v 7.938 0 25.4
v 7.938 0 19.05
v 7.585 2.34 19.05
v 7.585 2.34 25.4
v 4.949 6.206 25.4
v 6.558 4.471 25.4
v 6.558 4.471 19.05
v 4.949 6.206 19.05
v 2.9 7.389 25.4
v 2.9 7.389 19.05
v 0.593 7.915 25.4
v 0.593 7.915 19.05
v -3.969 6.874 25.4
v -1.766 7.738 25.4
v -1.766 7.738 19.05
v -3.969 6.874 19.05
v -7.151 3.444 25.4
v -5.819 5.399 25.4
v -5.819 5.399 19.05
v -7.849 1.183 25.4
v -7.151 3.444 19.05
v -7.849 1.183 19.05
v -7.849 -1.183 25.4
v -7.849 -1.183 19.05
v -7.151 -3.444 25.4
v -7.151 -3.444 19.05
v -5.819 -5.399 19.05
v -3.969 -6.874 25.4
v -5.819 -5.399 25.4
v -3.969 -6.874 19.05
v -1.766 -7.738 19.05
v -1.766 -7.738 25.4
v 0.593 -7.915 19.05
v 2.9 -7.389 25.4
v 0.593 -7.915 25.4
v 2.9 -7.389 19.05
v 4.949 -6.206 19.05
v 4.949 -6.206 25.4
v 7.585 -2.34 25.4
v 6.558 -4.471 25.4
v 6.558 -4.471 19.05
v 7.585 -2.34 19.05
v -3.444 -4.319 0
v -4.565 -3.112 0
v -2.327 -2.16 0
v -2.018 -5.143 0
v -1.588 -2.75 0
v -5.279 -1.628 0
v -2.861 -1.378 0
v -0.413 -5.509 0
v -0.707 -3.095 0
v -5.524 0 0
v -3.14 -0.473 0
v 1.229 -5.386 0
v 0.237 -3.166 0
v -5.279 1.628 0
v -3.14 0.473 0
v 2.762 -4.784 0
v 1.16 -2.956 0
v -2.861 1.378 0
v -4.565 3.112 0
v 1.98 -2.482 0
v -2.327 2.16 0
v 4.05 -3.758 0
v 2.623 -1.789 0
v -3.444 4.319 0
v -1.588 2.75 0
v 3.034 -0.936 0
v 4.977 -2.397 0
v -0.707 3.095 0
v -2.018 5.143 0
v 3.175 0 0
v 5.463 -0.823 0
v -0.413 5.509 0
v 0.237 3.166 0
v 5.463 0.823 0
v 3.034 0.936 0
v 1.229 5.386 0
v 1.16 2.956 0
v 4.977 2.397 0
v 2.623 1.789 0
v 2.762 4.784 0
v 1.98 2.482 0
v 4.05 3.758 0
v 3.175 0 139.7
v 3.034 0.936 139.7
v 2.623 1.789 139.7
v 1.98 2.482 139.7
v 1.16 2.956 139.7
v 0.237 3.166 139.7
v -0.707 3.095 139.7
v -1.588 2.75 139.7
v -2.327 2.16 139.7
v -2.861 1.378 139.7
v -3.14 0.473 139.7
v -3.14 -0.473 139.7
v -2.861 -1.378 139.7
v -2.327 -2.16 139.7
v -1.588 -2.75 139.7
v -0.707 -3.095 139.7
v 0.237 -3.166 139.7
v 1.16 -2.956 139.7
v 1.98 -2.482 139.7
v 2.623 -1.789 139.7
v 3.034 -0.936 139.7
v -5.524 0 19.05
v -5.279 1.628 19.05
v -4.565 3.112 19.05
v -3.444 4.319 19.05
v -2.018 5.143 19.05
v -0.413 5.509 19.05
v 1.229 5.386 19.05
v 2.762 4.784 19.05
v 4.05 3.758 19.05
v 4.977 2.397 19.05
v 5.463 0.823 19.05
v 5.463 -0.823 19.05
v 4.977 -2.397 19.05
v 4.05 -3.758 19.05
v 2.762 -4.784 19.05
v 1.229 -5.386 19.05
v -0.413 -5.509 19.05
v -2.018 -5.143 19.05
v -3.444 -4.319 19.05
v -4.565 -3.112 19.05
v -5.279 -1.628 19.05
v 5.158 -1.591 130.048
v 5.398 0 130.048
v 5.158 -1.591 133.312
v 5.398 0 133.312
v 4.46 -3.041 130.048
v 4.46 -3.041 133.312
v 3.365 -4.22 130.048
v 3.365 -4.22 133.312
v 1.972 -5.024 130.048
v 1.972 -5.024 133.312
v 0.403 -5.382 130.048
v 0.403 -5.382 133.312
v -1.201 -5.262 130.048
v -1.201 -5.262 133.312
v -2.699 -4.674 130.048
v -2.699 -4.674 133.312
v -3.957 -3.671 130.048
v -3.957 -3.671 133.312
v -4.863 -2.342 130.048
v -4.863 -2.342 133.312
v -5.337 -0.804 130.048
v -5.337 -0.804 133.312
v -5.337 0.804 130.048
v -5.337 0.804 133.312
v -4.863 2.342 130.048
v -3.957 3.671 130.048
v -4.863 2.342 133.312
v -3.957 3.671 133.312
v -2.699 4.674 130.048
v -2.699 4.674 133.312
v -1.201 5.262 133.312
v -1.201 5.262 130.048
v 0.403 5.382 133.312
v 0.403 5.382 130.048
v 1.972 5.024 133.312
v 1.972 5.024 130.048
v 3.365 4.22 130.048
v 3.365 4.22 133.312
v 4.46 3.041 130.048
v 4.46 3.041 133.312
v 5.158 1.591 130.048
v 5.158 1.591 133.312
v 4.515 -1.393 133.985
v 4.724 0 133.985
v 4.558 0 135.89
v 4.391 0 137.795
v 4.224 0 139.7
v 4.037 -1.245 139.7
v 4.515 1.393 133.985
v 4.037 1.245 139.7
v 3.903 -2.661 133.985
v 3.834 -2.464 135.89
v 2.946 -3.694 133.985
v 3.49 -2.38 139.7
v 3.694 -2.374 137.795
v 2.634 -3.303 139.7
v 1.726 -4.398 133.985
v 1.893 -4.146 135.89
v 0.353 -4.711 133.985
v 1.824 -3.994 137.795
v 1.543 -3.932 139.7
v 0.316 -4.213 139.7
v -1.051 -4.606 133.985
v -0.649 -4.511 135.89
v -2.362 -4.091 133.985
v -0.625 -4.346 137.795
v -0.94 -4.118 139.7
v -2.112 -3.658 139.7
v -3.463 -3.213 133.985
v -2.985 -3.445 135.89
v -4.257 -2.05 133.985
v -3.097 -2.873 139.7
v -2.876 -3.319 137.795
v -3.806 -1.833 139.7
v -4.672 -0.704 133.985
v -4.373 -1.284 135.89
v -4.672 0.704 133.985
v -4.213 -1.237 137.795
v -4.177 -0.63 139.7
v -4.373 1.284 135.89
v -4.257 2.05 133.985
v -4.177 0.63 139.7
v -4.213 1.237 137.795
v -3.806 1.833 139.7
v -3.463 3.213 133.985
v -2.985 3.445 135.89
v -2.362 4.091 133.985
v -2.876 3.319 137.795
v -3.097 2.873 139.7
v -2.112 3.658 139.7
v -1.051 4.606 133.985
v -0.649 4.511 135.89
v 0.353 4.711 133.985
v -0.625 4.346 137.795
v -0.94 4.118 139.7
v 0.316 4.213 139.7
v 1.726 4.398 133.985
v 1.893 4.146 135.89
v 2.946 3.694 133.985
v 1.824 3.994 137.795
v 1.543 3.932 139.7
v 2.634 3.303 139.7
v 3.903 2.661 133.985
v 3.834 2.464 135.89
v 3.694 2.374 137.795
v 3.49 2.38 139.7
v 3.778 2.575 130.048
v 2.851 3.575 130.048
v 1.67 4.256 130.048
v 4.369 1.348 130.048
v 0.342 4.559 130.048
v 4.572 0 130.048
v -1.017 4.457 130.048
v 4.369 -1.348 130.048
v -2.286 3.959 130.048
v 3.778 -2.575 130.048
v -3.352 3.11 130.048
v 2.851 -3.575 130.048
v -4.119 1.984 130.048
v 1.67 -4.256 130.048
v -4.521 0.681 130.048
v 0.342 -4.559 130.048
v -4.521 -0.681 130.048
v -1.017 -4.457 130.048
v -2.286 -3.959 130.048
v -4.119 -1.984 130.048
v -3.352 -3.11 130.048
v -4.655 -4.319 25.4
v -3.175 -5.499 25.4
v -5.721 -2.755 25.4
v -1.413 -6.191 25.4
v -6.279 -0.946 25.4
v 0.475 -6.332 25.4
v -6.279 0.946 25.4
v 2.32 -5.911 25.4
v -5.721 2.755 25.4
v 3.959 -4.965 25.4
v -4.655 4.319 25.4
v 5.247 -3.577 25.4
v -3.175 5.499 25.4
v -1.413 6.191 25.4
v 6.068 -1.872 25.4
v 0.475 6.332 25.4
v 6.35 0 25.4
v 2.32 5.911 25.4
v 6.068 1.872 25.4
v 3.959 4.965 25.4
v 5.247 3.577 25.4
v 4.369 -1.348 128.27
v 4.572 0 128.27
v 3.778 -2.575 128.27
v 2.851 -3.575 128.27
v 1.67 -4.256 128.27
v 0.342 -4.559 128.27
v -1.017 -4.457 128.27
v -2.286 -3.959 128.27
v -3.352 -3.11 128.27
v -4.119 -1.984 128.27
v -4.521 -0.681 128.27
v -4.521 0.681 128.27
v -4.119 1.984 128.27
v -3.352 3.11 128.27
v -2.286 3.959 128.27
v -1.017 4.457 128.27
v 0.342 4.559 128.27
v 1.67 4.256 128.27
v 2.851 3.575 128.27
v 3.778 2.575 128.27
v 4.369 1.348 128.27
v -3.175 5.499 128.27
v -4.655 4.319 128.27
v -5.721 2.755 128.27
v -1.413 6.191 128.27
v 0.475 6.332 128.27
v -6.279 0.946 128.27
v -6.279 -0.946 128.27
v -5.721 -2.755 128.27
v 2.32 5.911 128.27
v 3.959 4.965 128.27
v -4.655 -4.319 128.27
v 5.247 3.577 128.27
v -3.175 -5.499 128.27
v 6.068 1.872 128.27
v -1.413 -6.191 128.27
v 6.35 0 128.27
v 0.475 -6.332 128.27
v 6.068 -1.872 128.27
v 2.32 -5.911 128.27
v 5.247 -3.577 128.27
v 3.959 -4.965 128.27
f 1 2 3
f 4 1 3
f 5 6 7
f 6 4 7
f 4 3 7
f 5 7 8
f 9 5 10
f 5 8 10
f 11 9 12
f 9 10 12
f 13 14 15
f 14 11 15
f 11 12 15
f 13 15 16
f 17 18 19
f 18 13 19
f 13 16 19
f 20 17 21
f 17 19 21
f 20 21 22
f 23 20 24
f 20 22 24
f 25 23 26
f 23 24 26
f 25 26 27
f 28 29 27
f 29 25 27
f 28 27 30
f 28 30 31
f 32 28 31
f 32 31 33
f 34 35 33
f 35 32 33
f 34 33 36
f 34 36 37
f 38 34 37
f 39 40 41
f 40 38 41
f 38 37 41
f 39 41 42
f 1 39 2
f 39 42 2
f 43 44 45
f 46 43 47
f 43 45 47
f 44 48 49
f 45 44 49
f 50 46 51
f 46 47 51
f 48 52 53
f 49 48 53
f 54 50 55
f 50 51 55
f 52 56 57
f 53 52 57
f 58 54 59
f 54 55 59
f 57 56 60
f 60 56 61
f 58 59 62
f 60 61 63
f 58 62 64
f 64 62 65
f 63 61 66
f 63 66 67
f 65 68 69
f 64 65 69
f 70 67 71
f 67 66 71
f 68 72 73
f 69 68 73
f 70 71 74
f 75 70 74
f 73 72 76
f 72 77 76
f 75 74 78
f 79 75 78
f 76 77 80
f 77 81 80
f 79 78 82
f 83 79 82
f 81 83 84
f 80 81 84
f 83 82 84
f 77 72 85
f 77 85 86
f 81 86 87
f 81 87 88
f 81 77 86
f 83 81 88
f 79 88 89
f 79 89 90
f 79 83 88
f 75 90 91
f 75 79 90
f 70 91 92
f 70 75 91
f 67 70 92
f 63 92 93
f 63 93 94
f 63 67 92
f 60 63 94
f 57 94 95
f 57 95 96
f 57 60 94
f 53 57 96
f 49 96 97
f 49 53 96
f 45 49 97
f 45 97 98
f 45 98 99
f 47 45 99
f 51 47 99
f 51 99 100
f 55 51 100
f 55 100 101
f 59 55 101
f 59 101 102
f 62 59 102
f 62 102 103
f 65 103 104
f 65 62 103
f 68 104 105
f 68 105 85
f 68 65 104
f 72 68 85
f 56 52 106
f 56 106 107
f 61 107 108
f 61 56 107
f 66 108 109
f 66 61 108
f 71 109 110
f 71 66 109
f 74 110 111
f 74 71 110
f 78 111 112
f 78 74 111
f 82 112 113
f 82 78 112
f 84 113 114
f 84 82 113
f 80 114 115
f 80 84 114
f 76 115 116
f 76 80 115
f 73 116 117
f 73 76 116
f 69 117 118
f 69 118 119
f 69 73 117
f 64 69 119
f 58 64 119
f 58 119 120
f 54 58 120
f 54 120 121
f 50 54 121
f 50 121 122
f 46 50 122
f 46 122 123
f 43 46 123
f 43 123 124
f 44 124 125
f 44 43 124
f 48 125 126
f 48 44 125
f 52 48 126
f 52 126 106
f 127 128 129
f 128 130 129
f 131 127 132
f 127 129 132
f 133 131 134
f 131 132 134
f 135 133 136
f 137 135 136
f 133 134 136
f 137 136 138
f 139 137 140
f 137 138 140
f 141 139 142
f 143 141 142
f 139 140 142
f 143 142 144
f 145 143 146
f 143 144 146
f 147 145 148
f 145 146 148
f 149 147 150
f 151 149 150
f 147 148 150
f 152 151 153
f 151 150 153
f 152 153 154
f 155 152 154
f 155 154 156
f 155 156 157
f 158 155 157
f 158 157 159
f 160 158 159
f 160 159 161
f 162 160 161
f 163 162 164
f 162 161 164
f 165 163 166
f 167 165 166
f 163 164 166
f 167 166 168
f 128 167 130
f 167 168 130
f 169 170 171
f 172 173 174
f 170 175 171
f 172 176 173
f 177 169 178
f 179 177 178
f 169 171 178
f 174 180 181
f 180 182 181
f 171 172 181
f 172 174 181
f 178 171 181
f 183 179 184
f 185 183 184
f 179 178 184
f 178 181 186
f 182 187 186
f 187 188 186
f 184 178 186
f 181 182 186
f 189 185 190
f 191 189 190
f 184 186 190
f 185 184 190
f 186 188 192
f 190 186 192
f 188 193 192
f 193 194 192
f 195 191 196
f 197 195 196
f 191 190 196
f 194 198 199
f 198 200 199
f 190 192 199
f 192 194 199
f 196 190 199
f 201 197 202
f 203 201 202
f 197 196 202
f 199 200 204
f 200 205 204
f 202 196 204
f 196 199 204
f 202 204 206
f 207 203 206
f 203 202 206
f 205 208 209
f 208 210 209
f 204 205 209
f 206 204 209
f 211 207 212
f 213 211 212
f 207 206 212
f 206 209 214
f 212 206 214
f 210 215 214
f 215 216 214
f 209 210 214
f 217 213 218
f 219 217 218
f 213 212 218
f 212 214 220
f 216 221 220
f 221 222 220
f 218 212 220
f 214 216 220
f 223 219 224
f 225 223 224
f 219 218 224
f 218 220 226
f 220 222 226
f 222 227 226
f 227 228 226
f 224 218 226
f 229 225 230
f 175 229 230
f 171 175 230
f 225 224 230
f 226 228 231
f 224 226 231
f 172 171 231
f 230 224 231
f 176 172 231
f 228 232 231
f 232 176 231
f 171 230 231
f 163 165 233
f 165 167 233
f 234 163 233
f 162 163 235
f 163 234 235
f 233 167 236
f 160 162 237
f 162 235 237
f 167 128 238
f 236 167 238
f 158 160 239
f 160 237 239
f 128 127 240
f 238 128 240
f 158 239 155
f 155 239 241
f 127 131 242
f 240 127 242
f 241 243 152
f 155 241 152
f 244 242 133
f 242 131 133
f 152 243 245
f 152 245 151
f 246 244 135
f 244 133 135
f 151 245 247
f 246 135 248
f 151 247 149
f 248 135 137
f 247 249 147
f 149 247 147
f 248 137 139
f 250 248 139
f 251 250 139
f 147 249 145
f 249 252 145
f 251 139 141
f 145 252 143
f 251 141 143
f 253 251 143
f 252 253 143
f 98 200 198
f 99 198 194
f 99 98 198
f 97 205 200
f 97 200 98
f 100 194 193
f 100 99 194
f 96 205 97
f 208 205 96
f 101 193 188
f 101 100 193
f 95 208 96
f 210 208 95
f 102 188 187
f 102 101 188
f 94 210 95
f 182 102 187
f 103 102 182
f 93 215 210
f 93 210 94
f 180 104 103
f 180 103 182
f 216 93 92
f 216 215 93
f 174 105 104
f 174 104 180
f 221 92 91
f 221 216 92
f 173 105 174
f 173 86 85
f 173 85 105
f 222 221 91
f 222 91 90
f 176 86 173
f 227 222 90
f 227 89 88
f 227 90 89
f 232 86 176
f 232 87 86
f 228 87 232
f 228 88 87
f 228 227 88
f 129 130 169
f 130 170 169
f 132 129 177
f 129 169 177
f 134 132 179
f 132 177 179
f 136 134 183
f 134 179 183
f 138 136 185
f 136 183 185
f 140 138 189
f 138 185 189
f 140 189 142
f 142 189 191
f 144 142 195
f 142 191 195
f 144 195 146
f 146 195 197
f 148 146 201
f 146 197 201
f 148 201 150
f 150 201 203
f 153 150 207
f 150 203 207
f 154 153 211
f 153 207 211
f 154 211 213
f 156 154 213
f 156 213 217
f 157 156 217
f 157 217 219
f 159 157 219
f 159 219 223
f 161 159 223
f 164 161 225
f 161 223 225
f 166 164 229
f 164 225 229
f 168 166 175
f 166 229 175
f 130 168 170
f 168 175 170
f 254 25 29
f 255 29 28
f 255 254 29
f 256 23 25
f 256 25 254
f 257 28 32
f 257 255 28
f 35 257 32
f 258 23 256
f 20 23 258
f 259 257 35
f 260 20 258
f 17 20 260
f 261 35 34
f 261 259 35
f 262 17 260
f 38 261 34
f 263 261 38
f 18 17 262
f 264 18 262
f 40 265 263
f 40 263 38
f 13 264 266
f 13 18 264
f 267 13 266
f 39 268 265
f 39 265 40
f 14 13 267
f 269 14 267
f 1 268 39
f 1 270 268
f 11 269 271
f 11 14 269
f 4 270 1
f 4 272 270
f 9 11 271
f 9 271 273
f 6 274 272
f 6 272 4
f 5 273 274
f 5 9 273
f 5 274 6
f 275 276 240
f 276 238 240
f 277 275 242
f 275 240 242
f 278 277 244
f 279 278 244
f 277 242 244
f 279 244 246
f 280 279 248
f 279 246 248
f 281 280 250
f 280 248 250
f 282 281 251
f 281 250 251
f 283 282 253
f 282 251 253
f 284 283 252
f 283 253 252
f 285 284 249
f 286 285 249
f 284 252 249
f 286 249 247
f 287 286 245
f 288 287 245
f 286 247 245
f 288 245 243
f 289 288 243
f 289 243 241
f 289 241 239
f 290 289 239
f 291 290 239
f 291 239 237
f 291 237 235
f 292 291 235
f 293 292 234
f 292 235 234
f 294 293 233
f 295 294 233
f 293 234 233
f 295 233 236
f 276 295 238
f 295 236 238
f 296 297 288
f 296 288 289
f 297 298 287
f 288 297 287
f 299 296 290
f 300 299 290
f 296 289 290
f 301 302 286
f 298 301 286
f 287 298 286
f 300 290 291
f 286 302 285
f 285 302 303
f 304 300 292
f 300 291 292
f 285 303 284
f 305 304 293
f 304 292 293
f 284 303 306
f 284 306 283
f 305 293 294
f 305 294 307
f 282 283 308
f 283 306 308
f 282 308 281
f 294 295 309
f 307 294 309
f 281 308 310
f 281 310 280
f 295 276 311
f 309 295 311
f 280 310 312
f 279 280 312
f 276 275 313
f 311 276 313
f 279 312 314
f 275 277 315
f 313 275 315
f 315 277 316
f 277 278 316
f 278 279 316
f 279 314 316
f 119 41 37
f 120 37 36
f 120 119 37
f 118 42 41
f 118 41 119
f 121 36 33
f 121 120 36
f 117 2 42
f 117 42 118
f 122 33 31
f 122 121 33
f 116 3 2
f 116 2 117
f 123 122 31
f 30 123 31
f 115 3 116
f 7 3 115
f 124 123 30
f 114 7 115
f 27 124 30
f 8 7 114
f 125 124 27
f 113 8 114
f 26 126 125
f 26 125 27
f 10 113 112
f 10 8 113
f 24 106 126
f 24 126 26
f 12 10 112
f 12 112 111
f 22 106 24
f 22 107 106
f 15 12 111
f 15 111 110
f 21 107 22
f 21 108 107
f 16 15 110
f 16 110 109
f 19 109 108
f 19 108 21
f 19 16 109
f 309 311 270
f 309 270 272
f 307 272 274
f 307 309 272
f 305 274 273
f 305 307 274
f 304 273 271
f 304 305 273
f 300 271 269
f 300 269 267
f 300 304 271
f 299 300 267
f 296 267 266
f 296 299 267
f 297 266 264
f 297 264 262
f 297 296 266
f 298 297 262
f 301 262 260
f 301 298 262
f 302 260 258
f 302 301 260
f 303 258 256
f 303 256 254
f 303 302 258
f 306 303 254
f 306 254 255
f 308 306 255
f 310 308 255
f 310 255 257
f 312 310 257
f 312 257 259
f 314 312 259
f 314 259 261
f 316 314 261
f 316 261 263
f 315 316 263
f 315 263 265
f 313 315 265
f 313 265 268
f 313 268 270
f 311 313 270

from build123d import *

# Parameters (mm, degrees)
SKETCH2_R           = 7.9375
SKETCH2_R_2         = 3.175
BOSS_EXTRUDE1_DEPTH = 139.7
SKETCH3_OUTSIDE_W   = 46.174
SKETCH3_OUTSIDE_H   = 46.174
SKETCH3_OUTSIDE_R   = 5.5245
CUT_EXTRUDE1_DEPTH  = 19.05
SKETCH4_OUTSIDE_W   = 46.174
SKETCH4_OUTSIDE_H   = 46.174
SKETCH4_OUTSIDE_R   = 6.35
CUT_EXTRUDE2_DEPTH  = 114.3


with BuildPart() as part:
    # Sketch2 → Boss-Extrude1 (new body)
    with BuildSketch(Plane.XY):
        Circle(SKETCH2_R)
        Circle(SKETCH2_R_2, mode=Mode.SUBTRACT)
    extrude(amount=BOSS_EXTRUDE1_DEPTH)

    # Sketch3 outside → Cut-Extrude1 (cut)
    with BuildSketch(Plane(origin=(0, 0, 0), x_dir=(-1, 0, 0), z_dir=(0, 0, -1))):
        Rectangle(SKETCH3_OUTSIDE_W, SKETCH3_OUTSIDE_H)
        Circle(SKETCH3_OUTSIDE_R, mode=Mode.SUBTRACT)
    extrude(amount=-CUT_EXTRUDE1_DEPTH, mode=Mode.SUBTRACT)

    # Sketch4 outside → Cut-Extrude2 (cut)
    with BuildSketch(Plane.XY.offset(139.7)):
        Rectangle(SKETCH4_OUTSIDE_W, SKETCH4_OUTSIDE_H)
        Circle(SKETCH4_OUTSIDE_R, mode=Mode.SUBTRACT)
    extrude(amount=-CUT_EXTRUDE2_DEPTH, mode=Mode.SUBTRACT)

    # Sketch9 → Cut-Revolve1 (revolve, cut)
    with BuildSketch(Plane(origin=(0, 0, 0), x_dir=(0, 0, -1), z_dir=(1, 0, 0)), mode=Mode.PRIVATE) as cut_revolve1_sk:
        Polygon((-133.985, 4.7244), (-139.7, 4.224402288), (-139.7, 6.35), (-128.27, 6.35), (-128.27, 4.572), (-130.048, 4.572), (-130.048, 5.3975), (-133.3119, 5.3975), align=None)
    revolve(cut_revolve1_sk.sketch.rotate(Axis((0, 0, 139.7), (0, 0, -1)), 90), axis=Axis((0, 0, 139.7), (0, 0, -1)), mode=Mode.SUBTRACT)


solid = part.part
